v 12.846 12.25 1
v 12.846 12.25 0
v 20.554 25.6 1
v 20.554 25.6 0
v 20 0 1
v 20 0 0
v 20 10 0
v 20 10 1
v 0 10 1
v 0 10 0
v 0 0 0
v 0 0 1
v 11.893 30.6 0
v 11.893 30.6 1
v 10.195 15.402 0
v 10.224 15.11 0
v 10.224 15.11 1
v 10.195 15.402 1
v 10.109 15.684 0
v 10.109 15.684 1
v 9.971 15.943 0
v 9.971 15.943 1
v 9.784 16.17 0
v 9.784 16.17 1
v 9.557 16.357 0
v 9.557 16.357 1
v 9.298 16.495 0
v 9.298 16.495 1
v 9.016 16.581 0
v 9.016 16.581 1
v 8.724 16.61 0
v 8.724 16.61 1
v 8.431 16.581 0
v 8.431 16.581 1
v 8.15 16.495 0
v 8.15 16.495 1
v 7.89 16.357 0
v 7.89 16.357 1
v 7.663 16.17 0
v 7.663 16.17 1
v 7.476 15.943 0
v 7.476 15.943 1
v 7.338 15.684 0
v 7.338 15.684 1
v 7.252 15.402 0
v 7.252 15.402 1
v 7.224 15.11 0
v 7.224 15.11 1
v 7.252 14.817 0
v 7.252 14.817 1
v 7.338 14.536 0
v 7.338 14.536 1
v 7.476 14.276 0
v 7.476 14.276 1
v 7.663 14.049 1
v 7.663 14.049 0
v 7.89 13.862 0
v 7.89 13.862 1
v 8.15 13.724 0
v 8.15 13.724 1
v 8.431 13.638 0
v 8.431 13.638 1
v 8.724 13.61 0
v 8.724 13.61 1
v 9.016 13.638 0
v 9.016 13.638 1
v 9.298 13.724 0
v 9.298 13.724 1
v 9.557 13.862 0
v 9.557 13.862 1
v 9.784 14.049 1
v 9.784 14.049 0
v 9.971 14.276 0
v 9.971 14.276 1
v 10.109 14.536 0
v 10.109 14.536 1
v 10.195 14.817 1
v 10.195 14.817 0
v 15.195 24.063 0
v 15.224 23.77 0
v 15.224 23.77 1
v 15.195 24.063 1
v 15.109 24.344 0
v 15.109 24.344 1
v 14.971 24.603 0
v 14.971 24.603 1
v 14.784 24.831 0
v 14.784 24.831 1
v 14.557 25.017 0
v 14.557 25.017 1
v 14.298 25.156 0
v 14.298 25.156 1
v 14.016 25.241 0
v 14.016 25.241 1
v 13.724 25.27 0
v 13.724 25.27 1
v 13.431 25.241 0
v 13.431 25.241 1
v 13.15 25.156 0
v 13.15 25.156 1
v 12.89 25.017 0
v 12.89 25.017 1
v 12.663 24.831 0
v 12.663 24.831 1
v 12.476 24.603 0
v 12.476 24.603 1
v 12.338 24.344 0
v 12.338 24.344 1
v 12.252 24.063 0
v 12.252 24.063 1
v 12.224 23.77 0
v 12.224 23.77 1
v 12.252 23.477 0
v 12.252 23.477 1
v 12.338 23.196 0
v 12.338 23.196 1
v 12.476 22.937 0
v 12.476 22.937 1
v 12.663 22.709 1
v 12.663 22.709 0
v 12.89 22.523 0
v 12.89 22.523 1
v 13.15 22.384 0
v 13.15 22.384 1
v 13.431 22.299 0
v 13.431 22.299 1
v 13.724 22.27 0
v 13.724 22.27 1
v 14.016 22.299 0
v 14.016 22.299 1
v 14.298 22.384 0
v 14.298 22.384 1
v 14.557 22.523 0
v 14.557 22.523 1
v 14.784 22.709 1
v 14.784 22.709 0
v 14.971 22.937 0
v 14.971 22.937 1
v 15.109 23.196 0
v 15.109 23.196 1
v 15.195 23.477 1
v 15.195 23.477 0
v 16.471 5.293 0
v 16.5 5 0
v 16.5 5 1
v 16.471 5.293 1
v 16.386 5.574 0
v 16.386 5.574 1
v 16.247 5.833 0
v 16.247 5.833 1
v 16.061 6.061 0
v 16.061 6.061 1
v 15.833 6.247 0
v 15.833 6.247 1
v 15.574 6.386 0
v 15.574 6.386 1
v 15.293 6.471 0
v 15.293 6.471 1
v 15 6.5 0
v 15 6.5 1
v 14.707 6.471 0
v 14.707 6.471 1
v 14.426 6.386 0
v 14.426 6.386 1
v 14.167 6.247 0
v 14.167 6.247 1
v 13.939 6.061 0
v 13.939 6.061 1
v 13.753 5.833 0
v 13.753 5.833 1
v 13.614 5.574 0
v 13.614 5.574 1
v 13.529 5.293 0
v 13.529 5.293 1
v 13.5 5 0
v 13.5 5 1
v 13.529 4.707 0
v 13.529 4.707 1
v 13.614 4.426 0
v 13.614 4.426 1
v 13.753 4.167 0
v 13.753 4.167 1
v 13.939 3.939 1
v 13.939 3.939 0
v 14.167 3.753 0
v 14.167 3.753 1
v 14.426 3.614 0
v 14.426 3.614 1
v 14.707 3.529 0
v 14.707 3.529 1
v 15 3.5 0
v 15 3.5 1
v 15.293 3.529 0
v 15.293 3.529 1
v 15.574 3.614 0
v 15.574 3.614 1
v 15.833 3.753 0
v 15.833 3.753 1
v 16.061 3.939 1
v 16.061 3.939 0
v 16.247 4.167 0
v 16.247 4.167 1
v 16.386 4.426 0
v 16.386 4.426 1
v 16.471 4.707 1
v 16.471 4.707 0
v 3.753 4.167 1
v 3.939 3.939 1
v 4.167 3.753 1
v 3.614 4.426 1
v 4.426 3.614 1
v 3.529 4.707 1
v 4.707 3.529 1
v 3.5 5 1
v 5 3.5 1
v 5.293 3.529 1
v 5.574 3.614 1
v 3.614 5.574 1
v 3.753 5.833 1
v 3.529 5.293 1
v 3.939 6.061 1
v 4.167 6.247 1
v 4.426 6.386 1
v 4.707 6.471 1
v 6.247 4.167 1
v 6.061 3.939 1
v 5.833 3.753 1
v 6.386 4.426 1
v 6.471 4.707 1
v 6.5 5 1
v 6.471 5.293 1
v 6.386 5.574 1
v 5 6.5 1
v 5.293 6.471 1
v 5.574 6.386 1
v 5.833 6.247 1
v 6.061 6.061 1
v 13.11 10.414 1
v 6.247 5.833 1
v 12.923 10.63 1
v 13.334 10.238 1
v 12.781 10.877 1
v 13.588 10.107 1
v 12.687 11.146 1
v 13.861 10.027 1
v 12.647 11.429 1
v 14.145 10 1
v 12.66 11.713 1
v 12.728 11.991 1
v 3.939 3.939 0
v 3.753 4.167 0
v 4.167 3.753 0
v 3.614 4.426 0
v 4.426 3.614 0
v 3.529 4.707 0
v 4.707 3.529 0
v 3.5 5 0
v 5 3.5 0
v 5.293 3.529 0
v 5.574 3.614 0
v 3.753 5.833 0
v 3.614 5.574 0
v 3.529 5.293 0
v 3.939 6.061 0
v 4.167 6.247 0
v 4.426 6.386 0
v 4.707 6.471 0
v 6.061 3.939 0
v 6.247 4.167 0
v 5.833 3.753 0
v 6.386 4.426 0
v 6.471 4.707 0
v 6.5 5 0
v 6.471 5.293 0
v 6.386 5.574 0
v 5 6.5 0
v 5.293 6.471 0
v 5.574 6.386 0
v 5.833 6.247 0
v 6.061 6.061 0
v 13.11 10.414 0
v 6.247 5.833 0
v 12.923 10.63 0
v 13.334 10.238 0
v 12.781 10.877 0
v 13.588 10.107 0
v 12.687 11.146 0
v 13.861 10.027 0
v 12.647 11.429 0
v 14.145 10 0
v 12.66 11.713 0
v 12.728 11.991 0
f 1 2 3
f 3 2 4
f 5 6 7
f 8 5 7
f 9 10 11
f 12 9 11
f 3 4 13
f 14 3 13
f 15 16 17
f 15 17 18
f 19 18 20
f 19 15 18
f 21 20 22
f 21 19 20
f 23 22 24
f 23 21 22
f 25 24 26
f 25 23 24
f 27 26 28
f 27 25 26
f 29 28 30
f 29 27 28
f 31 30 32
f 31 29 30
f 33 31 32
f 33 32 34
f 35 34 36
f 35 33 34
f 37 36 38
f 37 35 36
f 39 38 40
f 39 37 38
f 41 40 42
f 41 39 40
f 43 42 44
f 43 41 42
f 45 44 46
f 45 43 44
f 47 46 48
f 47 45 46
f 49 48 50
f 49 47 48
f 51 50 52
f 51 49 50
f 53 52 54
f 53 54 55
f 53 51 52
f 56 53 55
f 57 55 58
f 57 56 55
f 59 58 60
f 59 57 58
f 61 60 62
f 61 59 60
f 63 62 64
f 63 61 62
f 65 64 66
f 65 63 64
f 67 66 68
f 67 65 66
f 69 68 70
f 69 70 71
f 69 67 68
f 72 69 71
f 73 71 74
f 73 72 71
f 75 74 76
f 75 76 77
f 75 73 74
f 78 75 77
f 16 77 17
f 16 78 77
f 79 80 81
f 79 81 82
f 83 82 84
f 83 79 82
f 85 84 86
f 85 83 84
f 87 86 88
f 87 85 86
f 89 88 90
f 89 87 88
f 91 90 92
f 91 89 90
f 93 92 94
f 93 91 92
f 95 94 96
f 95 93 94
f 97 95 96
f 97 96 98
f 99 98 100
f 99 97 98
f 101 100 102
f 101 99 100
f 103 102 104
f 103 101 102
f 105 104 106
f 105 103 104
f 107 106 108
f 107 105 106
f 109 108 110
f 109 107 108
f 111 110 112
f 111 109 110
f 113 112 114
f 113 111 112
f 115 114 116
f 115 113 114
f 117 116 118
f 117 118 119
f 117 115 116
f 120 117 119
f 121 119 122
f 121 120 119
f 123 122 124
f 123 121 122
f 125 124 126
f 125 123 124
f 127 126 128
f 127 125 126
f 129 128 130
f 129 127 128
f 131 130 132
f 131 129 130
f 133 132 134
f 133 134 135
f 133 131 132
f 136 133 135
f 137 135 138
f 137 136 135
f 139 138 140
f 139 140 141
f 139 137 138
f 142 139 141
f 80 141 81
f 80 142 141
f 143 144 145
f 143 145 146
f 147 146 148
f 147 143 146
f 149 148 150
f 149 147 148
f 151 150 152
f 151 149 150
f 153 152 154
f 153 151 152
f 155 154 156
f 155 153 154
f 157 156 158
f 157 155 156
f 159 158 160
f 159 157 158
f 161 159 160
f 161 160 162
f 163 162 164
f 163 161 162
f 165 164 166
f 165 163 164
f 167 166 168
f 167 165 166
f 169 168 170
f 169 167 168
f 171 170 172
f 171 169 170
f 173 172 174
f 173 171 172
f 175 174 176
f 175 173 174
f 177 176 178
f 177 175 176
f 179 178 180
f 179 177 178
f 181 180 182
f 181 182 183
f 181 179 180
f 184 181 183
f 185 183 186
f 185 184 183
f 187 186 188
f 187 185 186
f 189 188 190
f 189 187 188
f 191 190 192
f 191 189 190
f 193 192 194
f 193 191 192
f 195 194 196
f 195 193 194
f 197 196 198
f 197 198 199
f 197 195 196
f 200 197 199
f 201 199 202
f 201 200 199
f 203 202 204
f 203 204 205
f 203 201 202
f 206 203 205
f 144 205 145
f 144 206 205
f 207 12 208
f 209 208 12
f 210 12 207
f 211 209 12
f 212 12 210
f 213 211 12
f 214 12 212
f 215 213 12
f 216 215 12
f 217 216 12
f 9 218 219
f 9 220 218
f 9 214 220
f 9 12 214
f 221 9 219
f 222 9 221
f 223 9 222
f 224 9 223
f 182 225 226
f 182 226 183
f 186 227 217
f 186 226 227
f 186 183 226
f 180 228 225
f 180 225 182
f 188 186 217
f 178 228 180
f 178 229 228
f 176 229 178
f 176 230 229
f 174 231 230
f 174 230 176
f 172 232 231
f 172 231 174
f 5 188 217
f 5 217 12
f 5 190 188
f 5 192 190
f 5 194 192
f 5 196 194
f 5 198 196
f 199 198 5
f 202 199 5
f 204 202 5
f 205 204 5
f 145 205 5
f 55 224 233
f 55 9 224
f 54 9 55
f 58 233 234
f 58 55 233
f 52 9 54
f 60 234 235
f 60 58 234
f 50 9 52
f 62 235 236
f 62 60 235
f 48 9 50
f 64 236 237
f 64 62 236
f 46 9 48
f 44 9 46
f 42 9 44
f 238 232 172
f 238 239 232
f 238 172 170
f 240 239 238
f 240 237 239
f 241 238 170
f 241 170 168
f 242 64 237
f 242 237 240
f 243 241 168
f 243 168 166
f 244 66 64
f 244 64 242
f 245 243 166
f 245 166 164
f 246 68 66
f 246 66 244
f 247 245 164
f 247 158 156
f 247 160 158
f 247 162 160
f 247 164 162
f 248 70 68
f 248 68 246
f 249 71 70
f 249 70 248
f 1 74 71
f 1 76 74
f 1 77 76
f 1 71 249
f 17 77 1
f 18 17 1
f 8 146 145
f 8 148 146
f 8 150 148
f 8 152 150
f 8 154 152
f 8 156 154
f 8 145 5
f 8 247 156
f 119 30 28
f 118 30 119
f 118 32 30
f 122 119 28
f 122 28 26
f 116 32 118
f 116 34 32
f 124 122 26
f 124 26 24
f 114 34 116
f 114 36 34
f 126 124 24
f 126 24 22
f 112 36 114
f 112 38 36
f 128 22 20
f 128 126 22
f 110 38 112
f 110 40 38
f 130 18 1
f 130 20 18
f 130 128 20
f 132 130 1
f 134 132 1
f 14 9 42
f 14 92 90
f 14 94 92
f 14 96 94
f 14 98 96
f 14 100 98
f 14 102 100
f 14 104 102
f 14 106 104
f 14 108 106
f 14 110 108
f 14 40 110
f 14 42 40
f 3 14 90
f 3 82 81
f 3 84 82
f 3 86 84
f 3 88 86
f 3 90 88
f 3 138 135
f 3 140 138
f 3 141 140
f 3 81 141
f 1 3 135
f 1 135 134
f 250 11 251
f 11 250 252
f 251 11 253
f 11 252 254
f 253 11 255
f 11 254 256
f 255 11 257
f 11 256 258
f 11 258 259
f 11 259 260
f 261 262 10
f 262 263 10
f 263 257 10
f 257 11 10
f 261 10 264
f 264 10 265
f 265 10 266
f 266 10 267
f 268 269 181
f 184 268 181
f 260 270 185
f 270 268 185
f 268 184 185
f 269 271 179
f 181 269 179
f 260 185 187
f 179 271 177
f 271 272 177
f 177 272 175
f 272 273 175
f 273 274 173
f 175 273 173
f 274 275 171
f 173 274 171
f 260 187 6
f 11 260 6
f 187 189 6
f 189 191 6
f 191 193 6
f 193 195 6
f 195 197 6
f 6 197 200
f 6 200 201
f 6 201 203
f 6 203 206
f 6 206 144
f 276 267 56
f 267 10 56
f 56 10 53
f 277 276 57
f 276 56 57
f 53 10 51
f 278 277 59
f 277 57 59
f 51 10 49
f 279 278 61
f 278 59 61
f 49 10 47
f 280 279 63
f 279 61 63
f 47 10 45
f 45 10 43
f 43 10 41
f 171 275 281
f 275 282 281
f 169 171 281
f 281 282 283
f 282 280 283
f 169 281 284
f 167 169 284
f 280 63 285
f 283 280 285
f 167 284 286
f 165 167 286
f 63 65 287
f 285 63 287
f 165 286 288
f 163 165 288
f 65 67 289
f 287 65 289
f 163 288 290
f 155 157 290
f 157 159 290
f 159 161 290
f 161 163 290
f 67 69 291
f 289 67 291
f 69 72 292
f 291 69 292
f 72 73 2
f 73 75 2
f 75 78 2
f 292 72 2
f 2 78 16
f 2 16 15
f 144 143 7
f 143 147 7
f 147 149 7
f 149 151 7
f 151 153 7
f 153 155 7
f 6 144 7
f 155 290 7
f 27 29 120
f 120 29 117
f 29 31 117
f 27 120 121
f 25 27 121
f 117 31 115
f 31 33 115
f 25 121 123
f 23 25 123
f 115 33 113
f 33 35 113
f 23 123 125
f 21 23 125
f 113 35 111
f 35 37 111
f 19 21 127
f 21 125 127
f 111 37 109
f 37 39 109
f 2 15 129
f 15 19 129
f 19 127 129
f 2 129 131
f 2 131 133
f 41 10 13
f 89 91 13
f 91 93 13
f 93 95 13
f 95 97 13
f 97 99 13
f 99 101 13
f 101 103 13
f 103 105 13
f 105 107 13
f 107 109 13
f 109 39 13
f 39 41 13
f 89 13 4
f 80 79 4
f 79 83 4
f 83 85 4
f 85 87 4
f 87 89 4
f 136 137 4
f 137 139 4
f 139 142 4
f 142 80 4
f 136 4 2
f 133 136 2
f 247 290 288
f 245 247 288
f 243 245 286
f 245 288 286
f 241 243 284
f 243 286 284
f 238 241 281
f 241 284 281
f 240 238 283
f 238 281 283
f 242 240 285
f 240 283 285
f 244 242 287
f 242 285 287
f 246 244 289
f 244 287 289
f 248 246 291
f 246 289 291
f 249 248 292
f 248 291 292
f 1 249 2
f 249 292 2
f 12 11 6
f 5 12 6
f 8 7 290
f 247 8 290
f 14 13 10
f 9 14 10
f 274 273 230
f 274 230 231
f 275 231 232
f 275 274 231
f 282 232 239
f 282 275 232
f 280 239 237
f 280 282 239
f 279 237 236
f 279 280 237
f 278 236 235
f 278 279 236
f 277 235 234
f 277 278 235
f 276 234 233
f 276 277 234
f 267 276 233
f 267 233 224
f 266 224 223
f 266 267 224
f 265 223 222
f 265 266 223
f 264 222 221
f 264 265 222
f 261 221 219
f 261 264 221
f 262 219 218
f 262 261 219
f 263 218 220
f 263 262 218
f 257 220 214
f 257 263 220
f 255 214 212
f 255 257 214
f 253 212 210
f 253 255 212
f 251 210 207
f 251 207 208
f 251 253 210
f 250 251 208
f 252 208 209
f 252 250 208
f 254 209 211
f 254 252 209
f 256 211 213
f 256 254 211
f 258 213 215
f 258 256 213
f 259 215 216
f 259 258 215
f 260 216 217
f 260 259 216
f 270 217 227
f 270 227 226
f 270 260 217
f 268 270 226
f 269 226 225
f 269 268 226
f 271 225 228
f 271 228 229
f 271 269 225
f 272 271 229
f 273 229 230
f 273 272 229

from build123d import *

# Parameters (mm, degrees)
ESQUISSE1_R        = 1.5
BOSS_EXTRU_1_DEPTH = 1


with BuildPart() as part:
    # Esquisse1 → Boss.-Extru.1 (new body)
    with BuildSketch(Plane.XY):
        with BuildLine():
            Line((0, 0), (20, 0))
            Line((20, 0), (20, 10))
            Line((20, 10), (14.145081595, 10))
            ThreePointArc((14.145081595, 10), (12.846043489, 10.75), (12.846043489, 12.25))
            Line((12.846043489, 12.25), (20.553669583, 25.6))
            Line((20.553669583, 25.6), (11.893415545, 30.6))
            Line((11.893415545, 30.6), (0, 10))
            Line((0, 10), (0, 0))
        make_face()
        with Locations((5, 5)):
            Circle(ESQUISSE1_R, mode=Mode.SUBTRACT)
        with Locations((15, 5)):
            Circle(ESQUISSE1_R, mode=Mode.SUBTRACT)
        with Locations((13.723542564, 23.769872981)):
            Circle(ESQUISSE1_R, mode=Mode.SUBTRACT)
        with Locations((8.723542564, 15.109618943)):
            Circle(ESQUISSE1_R, mode=Mode.SUBTRACT)
    extrude(amount=BOSS_EXTRU_1_DEPTH)


solid = part.part
